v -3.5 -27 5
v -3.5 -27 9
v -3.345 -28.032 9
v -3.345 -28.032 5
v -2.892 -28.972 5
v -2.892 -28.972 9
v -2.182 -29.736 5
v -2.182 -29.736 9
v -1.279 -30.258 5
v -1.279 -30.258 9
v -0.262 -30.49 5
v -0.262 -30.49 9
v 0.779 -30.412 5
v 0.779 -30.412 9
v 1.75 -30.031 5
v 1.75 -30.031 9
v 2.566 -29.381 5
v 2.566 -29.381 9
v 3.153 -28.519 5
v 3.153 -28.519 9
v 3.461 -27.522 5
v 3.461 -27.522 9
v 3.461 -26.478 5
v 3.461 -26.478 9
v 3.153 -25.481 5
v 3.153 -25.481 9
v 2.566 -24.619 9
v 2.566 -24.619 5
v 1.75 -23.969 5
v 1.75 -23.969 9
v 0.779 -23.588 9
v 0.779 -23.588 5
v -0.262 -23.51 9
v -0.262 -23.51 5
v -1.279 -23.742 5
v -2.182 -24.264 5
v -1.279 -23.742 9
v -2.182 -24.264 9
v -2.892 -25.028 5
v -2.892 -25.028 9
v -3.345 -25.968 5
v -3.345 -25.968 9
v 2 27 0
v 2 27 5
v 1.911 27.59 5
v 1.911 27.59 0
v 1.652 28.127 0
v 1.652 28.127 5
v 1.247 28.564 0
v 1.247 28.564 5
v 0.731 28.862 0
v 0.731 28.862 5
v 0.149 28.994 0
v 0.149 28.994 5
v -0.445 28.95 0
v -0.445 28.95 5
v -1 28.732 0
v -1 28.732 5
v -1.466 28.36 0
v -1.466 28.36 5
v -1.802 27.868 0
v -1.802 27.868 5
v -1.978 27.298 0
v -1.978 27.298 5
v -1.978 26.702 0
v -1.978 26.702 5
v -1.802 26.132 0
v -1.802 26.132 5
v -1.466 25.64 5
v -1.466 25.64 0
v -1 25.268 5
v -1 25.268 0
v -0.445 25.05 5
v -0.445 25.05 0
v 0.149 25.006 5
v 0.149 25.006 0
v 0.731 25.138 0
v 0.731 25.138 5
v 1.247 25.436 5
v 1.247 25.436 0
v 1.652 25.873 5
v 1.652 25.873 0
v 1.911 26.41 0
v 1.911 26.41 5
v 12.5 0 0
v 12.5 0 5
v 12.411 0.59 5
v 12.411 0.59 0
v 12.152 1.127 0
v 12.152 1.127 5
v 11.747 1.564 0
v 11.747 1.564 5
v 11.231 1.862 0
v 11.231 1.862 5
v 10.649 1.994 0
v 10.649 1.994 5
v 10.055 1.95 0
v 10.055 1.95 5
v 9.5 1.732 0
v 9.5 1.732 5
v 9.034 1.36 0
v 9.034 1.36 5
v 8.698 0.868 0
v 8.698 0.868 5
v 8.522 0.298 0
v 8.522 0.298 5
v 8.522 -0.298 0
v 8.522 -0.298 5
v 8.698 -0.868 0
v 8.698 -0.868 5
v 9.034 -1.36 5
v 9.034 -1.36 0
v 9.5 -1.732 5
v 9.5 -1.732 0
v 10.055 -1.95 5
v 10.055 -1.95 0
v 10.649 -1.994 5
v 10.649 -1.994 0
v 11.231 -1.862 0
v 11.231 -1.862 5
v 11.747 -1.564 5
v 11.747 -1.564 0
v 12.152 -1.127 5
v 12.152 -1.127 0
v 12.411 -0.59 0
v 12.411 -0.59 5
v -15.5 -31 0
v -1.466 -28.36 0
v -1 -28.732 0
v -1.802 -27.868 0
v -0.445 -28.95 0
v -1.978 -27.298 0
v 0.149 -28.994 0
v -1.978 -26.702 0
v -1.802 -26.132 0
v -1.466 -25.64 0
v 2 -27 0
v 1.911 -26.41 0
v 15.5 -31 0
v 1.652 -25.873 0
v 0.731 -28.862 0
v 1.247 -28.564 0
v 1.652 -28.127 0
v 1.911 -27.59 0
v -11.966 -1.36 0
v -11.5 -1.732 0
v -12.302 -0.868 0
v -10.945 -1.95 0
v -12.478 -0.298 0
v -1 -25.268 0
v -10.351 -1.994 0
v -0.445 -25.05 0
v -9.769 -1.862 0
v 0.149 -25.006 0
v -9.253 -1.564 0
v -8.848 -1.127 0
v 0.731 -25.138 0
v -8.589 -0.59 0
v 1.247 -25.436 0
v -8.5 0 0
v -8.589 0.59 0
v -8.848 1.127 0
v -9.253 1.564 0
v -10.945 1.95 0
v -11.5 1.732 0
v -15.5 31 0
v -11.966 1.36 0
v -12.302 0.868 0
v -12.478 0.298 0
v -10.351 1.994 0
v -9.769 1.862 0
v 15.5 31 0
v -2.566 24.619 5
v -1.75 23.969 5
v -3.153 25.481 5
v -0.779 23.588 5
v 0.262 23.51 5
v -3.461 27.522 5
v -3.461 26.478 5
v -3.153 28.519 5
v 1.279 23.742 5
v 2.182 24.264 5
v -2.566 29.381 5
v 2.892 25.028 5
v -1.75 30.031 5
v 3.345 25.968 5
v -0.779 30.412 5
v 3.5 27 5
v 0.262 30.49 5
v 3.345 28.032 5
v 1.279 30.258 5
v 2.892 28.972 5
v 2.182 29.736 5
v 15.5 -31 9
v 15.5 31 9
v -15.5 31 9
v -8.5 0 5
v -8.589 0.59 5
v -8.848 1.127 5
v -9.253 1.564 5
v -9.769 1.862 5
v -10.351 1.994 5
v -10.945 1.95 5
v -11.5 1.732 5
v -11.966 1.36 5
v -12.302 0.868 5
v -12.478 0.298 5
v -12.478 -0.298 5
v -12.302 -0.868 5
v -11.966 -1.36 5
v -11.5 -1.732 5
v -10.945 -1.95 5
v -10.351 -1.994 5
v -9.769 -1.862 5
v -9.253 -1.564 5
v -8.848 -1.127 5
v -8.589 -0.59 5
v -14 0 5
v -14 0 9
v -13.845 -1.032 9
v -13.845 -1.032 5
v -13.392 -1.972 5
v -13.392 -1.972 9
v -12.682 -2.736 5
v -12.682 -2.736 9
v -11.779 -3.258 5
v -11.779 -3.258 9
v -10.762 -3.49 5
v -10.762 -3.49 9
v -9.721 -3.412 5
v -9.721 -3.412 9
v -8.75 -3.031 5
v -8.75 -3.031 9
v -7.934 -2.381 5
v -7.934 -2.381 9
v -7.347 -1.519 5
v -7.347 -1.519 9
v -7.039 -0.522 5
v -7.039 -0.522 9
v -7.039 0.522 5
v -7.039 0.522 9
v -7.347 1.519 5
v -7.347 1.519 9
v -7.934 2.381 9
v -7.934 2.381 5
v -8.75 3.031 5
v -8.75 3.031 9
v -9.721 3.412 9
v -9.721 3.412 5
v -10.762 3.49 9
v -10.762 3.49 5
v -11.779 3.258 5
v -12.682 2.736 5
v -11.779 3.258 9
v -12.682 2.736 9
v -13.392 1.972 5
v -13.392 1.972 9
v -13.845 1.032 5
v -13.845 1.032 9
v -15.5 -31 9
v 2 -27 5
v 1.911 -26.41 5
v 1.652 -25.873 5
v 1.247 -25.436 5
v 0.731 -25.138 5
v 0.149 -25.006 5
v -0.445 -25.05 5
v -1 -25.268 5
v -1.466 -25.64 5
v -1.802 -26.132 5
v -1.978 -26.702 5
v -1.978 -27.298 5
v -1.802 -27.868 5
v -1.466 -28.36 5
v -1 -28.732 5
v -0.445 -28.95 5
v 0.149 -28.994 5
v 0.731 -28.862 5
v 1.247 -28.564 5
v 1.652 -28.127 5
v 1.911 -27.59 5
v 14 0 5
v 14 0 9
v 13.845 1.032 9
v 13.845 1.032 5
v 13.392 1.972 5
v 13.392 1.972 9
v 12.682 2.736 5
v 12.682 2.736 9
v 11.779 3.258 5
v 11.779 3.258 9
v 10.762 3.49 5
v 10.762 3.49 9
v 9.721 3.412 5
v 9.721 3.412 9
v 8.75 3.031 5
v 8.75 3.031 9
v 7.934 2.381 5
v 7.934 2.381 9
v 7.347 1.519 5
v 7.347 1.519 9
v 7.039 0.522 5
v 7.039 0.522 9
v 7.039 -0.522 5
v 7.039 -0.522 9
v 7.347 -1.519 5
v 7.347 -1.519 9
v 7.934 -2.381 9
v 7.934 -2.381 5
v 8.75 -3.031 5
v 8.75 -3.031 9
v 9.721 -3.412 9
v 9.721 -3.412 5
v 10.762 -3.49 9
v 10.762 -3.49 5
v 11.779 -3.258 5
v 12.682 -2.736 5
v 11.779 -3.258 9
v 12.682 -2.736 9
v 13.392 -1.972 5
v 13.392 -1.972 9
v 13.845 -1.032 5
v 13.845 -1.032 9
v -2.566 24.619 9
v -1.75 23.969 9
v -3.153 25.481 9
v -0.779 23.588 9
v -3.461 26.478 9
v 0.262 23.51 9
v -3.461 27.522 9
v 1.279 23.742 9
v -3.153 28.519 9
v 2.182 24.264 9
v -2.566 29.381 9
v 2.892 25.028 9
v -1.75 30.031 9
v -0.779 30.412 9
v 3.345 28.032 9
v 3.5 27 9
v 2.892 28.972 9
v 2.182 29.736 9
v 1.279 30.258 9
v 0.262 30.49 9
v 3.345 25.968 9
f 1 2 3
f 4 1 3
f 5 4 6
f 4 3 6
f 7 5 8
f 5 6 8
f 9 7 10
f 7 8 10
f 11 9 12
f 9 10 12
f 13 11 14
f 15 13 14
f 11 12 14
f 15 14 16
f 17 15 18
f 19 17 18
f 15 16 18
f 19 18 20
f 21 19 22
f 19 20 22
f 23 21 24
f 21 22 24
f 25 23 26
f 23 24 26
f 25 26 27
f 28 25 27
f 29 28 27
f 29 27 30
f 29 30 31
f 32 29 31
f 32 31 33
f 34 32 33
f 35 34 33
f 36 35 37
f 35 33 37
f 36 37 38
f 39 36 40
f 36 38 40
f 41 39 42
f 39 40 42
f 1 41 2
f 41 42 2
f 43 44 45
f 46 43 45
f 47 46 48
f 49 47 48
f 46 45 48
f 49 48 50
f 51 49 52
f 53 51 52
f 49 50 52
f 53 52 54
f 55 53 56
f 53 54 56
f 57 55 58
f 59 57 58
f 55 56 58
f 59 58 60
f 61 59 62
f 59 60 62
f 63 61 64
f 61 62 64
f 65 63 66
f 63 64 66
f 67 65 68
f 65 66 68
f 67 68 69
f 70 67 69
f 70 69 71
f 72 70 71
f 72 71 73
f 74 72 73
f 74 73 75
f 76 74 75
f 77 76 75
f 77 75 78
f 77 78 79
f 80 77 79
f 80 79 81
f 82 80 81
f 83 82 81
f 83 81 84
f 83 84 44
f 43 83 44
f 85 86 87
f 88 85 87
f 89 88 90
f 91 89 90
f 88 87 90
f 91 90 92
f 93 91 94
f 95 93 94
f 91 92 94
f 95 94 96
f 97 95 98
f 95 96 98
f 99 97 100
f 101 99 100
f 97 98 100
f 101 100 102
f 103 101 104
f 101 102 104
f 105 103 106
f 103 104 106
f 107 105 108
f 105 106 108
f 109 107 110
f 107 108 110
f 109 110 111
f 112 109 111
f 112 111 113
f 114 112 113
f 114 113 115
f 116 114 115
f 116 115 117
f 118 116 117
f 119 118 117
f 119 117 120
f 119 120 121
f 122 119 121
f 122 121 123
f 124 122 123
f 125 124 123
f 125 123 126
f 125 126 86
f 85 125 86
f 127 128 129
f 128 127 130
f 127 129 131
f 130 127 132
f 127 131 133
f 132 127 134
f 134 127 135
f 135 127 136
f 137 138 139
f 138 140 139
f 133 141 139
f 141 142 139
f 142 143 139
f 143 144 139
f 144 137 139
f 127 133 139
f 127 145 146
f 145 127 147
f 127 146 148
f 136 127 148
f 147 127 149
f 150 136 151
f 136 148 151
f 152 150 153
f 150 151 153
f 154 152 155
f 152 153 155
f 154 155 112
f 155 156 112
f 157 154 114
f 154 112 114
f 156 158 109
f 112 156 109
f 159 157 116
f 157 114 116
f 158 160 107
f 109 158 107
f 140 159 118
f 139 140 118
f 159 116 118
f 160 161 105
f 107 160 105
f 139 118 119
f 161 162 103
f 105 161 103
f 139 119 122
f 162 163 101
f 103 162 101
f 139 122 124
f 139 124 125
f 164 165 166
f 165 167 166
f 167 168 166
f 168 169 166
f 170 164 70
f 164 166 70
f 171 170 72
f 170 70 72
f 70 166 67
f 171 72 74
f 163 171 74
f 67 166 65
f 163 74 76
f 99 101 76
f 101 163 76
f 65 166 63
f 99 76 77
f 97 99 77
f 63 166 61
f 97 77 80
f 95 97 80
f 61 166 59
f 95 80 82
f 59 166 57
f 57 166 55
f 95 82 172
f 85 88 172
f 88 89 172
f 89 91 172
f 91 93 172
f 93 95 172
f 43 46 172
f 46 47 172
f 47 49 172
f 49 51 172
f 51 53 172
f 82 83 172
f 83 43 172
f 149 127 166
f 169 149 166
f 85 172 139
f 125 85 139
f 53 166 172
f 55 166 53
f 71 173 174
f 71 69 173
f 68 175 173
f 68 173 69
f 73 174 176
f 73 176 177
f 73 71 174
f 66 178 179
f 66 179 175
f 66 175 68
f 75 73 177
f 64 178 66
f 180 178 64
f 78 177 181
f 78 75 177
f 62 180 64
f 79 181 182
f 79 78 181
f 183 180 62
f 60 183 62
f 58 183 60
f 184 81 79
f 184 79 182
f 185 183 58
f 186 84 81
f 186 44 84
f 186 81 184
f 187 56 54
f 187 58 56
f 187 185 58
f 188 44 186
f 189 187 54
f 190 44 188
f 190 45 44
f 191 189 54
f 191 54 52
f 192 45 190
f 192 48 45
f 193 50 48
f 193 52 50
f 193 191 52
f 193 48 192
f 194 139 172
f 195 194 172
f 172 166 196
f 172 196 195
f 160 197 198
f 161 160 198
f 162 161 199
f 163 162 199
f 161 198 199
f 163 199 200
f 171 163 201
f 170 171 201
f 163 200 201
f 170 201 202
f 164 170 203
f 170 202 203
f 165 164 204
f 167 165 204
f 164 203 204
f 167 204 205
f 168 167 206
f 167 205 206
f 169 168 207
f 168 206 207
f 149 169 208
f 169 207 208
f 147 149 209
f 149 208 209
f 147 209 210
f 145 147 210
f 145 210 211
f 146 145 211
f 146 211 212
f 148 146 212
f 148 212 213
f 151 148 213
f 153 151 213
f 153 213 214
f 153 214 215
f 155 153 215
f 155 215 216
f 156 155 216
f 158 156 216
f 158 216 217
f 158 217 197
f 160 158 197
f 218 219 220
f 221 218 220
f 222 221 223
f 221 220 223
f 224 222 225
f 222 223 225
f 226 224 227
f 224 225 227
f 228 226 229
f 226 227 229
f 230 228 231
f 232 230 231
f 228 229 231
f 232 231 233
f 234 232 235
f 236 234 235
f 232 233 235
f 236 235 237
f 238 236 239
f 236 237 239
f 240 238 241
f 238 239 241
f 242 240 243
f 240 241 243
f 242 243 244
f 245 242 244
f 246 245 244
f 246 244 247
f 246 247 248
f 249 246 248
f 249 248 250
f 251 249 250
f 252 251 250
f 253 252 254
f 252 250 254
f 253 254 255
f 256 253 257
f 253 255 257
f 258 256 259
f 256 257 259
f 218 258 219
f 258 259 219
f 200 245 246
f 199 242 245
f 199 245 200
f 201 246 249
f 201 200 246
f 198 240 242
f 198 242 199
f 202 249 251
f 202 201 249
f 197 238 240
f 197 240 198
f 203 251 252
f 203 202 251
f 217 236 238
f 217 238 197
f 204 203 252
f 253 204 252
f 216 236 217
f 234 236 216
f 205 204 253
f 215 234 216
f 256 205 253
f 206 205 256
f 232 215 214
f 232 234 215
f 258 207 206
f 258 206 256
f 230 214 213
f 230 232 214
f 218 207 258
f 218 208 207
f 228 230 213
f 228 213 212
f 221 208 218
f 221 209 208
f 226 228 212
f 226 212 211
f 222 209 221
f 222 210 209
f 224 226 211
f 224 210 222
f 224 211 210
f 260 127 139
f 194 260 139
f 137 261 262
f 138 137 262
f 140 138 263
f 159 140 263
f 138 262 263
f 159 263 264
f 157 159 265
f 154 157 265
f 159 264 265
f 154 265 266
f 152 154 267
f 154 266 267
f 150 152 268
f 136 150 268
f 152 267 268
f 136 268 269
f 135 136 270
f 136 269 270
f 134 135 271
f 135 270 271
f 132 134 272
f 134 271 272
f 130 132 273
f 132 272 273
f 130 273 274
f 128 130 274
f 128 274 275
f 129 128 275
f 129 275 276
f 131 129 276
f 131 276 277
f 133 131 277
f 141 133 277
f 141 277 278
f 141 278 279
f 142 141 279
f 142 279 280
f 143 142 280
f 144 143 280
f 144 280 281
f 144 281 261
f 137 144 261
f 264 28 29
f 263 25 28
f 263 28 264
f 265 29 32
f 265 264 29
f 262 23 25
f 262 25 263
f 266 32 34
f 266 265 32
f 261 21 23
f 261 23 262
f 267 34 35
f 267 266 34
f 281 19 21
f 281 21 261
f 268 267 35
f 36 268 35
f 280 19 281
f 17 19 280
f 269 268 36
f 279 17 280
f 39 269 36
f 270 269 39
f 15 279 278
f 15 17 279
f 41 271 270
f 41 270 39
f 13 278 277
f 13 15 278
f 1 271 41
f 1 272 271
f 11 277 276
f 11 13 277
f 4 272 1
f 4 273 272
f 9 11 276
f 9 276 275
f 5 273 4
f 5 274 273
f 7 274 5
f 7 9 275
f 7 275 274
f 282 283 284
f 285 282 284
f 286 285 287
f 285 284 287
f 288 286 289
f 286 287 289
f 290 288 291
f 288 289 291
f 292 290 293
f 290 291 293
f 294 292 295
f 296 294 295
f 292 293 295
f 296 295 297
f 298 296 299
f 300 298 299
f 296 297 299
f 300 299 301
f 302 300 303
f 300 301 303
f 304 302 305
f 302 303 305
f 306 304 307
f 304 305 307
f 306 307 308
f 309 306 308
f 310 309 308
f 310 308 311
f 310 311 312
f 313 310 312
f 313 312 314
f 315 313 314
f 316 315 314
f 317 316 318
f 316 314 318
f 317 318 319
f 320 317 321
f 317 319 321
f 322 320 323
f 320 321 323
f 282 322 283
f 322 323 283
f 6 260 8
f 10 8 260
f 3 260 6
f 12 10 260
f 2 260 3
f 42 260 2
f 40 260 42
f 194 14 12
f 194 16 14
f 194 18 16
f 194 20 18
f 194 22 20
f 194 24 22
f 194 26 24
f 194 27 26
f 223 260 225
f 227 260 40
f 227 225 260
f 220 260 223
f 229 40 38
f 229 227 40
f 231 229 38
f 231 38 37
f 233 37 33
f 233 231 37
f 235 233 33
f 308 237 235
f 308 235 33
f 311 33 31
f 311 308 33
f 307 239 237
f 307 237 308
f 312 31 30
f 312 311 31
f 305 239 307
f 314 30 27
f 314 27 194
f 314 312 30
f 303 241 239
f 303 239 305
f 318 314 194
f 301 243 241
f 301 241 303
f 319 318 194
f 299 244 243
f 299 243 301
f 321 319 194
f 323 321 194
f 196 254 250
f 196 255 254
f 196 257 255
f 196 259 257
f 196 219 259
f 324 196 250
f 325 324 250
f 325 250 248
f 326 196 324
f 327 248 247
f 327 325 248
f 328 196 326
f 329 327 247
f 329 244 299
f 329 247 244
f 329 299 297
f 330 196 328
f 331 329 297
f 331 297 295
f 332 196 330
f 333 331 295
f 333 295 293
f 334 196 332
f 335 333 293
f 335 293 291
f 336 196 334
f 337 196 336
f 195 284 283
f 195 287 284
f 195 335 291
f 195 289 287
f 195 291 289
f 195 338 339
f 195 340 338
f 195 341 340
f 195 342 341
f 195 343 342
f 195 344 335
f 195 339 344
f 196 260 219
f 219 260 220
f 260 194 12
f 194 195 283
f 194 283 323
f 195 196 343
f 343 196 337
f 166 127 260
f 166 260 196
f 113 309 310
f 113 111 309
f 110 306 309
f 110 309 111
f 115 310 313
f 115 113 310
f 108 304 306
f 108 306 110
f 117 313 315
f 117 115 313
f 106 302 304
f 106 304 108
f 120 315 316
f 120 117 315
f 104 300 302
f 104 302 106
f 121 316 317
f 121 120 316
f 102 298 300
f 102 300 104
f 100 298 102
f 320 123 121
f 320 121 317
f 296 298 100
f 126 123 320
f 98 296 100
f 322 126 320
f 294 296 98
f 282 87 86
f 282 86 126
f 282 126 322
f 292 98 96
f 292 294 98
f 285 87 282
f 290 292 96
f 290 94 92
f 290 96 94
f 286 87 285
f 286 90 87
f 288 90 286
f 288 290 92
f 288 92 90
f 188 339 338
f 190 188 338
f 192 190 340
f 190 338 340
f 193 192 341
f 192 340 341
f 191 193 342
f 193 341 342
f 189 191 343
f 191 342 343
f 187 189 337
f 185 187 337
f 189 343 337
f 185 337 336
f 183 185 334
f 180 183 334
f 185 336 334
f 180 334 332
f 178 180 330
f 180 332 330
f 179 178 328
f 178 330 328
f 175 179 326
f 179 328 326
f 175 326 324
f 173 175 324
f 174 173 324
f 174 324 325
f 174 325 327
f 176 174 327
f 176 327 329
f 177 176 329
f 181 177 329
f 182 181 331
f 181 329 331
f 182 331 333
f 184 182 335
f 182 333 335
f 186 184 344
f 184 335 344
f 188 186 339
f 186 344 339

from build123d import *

# Parameters (mm, degrees)
SKETCH1_W           = 31
SKETCH1_H           = 62
BOSS_EXTRUDE1_DEPTH = 9
SKETCH2_R           = 2
CUT_EXTRUDE1_DEPTH  = 10
SKETCH3_R           = 3.5
CUT_EXTRUDE2_DEPTH  = 4


with BuildPart() as part:
    # Sketch1 → Boss-Extrude1 (new body)
    with BuildSketch(Plane.XY):
        Rectangle(SKETCH1_W, SKETCH1_H)
    extrude(amount=BOSS_EXTRUDE1_DEPTH)

    # Sketch2 → Cut-Extrude1 (cut)
    with BuildSketch(Plane.XY.offset(9)):
        with Locations((0, 27)):
            Circle(SKETCH2_R)
        with Locations((0, -27)):
            Circle(SKETCH2_R)
        with Locations((10.5, 0)):
            Circle(SKETCH2_R)
        with Locations((-10.5, 0)):
            Circle(SKETCH2_R)
    extrude(amount=-CUT_EXTRUDE1_DEPTH, mode=Mode.SUBTRACT)

    # Sketch3 → Cut-Extrude2 (cut)
    with BuildSketch(Plane.XY.offset(9)):
        with Locations((0, 27)):
            Circle(SKETCH3_R)
        with Locations((10.5, 0)):
            Circle(SKETCH3_R)
        with Locations(Location((-10.5, 0, 0), (0, 0, 180))):
            Circle(SKETCH3_R)
        with Locations(Location((0, -27, 0), (0, 0, 180))):
            Circle(SKETCH3_R)
    extrude(amount=-CUT_EXTRUDE2_DEPTH, mode=Mode.SUBTRACT)


solid = part.part
